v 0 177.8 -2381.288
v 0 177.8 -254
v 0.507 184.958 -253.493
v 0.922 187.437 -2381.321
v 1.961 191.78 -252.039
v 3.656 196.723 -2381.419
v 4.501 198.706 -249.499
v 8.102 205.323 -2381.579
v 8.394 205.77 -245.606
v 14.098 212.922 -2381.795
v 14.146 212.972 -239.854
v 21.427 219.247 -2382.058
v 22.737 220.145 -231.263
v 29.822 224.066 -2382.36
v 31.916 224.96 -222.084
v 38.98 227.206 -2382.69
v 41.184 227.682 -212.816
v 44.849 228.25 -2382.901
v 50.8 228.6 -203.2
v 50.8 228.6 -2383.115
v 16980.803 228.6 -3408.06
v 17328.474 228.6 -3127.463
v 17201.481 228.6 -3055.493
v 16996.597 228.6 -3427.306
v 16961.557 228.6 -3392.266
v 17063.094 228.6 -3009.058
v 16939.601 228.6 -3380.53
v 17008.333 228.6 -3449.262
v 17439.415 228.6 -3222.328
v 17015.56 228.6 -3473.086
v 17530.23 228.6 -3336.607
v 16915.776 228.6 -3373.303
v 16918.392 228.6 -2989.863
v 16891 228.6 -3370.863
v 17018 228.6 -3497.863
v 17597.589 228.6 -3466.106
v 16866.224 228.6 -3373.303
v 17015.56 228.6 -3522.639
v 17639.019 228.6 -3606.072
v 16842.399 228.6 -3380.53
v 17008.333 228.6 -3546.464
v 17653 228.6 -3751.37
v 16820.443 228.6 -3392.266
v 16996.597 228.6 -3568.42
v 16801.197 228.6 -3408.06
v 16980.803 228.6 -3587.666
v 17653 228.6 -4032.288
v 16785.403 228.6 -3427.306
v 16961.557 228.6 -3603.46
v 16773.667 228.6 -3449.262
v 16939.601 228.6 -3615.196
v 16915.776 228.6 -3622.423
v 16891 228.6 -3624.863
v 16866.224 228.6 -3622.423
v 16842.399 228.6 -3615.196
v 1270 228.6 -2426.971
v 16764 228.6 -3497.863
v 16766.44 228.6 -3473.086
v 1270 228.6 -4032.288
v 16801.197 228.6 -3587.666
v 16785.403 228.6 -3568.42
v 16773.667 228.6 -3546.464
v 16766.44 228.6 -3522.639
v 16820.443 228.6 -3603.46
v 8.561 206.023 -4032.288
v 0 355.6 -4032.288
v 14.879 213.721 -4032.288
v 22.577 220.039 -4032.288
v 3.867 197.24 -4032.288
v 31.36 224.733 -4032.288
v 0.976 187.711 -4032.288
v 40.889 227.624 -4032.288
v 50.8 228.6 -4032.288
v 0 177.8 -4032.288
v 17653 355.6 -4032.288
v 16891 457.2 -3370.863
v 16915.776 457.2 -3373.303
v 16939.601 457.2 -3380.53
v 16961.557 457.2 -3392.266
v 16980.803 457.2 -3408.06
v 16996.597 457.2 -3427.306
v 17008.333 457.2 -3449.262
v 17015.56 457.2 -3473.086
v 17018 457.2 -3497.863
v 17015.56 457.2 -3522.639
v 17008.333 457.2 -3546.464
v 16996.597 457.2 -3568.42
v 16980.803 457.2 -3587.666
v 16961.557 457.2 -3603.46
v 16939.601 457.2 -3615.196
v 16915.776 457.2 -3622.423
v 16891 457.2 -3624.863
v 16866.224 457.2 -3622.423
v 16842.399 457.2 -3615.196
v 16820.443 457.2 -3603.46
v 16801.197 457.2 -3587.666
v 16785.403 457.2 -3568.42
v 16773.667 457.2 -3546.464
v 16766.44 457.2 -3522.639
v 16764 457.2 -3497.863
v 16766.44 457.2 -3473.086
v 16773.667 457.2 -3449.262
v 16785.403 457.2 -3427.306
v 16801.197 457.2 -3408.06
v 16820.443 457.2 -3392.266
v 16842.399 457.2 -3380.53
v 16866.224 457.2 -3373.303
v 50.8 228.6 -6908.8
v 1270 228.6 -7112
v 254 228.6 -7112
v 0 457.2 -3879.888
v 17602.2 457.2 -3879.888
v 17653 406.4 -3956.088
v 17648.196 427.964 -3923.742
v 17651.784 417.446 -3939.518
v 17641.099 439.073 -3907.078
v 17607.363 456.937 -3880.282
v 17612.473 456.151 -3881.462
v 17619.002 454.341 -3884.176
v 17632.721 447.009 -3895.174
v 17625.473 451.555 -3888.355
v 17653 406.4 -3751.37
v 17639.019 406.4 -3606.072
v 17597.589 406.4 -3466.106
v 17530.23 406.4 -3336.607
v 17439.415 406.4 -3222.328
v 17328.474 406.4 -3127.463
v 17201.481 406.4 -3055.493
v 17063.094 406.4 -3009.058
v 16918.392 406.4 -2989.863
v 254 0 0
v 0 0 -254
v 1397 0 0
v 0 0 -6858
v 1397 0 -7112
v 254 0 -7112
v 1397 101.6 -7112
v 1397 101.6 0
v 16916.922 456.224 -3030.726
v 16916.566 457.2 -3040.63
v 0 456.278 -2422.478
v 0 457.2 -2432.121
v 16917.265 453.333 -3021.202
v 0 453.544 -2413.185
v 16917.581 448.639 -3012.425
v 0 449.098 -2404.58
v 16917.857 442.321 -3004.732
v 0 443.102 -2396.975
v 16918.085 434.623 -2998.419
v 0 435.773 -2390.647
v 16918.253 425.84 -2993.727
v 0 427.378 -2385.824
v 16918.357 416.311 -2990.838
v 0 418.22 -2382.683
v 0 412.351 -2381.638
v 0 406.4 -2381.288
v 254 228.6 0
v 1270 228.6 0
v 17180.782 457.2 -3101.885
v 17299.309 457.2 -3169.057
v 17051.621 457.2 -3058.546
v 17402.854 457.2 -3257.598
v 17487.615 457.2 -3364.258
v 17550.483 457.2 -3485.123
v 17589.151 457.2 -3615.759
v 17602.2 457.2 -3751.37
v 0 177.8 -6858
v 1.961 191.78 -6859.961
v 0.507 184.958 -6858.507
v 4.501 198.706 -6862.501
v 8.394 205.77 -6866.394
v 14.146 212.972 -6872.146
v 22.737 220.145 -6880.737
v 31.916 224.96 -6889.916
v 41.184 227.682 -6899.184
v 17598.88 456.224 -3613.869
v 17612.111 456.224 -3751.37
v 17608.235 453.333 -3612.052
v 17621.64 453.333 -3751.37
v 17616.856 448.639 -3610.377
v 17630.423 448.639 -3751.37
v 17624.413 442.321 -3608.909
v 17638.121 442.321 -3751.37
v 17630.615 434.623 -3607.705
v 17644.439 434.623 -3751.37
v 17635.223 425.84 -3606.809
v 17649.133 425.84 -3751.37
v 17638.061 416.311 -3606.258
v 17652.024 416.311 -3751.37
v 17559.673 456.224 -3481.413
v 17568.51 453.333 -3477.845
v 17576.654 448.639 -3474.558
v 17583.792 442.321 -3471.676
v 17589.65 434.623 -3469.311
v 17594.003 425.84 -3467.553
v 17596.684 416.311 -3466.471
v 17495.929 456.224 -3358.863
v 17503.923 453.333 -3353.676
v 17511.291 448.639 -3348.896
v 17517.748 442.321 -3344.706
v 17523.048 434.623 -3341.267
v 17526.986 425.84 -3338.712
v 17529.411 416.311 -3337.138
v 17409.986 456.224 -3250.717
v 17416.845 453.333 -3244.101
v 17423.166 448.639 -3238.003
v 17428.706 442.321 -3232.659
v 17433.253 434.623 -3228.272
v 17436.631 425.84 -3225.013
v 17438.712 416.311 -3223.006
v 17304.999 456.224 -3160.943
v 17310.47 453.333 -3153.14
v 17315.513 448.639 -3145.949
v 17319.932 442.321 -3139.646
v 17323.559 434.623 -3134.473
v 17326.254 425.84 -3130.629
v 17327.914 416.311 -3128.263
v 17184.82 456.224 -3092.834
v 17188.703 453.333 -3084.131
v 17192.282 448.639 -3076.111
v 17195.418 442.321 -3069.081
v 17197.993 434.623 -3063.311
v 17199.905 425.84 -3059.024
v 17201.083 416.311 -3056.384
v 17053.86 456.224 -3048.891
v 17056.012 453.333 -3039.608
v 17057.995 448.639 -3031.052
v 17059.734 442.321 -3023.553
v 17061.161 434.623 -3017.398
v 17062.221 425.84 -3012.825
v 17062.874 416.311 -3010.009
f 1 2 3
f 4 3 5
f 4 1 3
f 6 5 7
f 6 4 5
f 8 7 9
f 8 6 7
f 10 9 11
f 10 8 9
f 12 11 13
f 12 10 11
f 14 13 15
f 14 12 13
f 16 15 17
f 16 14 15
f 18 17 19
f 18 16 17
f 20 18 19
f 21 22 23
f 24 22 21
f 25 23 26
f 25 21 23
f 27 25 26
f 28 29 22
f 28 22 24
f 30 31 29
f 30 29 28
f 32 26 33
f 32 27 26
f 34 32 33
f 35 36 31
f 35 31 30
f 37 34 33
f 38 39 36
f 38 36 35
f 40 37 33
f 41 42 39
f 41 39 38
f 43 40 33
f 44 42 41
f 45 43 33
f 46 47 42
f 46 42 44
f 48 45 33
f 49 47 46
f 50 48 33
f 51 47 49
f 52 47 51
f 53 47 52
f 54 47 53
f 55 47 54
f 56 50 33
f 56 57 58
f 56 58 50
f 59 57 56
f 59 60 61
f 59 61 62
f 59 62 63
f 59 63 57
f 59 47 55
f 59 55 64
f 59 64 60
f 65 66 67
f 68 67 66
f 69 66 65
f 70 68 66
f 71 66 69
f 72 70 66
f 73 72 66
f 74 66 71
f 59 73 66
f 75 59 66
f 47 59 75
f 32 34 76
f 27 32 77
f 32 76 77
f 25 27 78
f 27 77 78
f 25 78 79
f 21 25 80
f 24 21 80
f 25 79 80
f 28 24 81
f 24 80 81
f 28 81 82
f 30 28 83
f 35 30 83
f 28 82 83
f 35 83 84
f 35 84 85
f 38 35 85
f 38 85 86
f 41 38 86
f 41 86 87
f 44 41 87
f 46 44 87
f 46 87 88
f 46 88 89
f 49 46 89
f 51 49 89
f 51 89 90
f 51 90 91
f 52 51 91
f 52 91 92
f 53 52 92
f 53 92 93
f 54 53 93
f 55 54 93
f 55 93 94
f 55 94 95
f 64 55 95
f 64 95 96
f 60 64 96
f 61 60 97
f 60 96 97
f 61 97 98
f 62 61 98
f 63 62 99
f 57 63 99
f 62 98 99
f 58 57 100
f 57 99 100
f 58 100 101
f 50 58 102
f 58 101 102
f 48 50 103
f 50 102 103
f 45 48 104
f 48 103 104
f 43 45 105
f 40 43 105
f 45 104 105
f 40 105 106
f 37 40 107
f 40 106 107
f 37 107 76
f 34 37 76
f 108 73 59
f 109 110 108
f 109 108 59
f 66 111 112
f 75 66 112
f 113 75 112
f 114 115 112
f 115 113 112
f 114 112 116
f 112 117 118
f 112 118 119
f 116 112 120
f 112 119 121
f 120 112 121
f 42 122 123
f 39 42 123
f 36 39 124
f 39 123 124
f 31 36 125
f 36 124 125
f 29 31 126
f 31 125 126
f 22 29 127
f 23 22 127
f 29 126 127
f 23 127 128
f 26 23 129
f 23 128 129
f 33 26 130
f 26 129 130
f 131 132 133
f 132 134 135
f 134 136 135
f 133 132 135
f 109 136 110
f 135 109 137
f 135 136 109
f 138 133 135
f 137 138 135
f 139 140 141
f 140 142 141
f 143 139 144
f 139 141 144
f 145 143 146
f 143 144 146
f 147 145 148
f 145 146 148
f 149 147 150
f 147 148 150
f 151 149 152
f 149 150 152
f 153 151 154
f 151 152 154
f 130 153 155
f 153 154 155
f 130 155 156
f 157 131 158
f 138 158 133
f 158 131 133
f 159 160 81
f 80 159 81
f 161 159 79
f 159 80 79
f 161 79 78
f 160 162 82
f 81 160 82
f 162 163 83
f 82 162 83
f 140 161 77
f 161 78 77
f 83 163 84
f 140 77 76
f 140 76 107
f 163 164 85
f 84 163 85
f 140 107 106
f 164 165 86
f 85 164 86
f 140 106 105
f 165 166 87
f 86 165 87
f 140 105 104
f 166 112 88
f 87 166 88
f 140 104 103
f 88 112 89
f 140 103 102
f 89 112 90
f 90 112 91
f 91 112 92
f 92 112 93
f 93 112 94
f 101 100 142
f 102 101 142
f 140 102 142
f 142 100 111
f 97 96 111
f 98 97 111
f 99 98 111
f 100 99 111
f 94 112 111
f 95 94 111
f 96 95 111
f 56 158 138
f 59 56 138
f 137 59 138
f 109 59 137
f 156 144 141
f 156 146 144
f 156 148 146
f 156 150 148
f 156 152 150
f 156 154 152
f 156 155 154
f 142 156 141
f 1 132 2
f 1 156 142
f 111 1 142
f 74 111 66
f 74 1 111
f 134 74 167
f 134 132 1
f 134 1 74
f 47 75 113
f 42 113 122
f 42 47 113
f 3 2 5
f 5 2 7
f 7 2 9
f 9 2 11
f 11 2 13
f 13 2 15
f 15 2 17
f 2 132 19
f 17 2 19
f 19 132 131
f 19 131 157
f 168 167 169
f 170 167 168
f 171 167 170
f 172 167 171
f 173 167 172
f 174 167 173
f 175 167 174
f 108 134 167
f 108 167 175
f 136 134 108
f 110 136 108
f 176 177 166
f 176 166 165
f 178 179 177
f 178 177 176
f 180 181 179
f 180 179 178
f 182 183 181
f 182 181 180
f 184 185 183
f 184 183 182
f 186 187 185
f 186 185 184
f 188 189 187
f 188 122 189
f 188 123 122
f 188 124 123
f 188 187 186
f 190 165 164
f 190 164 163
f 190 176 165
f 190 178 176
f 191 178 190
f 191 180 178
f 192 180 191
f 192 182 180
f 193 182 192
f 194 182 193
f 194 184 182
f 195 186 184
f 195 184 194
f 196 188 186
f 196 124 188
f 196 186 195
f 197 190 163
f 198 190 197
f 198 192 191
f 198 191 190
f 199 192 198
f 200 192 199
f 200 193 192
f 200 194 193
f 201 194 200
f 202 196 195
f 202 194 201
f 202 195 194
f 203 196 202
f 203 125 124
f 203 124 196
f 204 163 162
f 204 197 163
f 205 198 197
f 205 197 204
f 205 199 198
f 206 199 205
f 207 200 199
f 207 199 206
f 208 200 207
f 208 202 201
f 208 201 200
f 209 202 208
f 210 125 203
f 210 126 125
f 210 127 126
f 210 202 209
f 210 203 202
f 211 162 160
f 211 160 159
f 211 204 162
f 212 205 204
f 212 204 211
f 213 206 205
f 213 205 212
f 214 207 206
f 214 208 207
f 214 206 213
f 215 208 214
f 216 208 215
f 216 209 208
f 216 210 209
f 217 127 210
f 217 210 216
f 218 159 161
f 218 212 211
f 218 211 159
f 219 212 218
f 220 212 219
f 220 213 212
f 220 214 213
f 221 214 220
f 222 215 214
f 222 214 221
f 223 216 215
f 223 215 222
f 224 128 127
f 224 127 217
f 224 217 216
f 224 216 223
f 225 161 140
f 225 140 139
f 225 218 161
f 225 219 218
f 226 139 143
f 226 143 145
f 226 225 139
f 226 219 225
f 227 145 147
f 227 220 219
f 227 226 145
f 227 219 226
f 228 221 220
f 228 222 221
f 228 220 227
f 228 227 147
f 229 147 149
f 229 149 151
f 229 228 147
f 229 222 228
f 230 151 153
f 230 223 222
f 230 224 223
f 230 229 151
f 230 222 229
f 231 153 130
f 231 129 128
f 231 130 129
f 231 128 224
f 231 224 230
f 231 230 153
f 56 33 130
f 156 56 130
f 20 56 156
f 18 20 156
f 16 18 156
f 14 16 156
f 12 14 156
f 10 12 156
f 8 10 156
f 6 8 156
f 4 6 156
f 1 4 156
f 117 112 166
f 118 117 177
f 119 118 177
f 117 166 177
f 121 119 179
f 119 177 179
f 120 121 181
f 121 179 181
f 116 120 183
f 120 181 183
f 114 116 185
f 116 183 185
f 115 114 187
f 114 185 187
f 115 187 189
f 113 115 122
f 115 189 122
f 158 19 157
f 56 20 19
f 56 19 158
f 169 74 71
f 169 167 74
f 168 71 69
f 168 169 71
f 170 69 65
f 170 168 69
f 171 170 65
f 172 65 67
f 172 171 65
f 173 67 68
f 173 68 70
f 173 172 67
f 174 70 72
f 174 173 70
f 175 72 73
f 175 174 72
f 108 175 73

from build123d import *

# Parameters (mm, degrees)
SKETCH1_W           = 1397
SKETCH1_H           = 7112
BOSS_EXTRUDE1_DEPTH = 228.6
CHAMFER1_SIZE       = 127
CHAMFER3_SIZE       = 254
CHAMFER4_SIZE       = 254
BOSS_EXTRUDE2_DEPTH = 228.6
CHAMFER5_SIZE       = 101.6
CHAMFER5_SIZE2      = 152.4
FILLET1_R           = 762
FILLET2_R           = 50.8
SKETCH4_R           = 127
CUT_EXTRUDE1_DEPTH  = 19038.278819294


with BuildPart() as part:
    # Sketch1 → Boss-Extrude1 (new body)
    with BuildSketch(Plane(origin=(0, 0, 0), x_dir=(1, 0, 0), z_dir=(0, 1, 0))):
        with Locations((698.5, 3556)):
            Rectangle(SKETCH1_W, SKETCH1_H)
    extrude(amount=BOSS_EXTRUDE1_DEPTH)

    # Chamfer1
    chamfer1_edges = [part.edges().sort_by_distance(p)[0] for p in [
        (1397, 228.6, -3556),
    ]]
    chamfer(chamfer1_edges, length=CHAMFER1_SIZE)

    # Chamfer3
    chamfer3_edges = [part.edges().sort_by_distance(p)[0] for p in [
        (0, 114.3, -7112),
    ]]
    chamfer(chamfer3_edges, length=CHAMFER3_SIZE)

    # Chamfer4
    chamfer4_edges = [part.edges().sort_by_distance(p)[0] for p in [
        (0, 114.3, 0),
    ]]
    chamfer(chamfer4_edges, length=CHAMFER4_SIZE)

    # Sketch3 → Boss-Extrude2 (add)
    with BuildSketch(Plane(origin=(0, 228.6, 0), x_dir=(1, 0, 0), z_dir=(0, 1, 0))):
        Polygon((17653, 3016.28768746), (0, 2381.28768746), (0, 4032.28768746), (17653, 4032.28768746), align=None)
    extrude(amount=BOSS_EXTRUDE2_DEPTH)

    # Chamfer5
    chamfer5_edges = [part.edges().sort_by_distance(p)[0] for p in [
        (8826.5, 457.2, -4032.28768746),
    ]]
    chamfer5_side = [part.faces().sort_by_distance(p)[0] for p in [
        (8826.5, 342.9, -4032.28768746),
    ]]
    chamfer(chamfer5_edges, length=CHAMFER5_SIZE, length2=CHAMFER5_SIZE2, reference=chamfer5_side[0])

    # Fillet1
    fillet1_edges = [part.edges().sort_by_distance(p)[0] for p in [
        (17653, 342.9, -3016.28768746),
    ]]
    fillet(fillet1_edges, radius=FILLET1_R)

    # Fillet2
    fillet2_edges = [part.edges().sort_by_distance(p)[0] for p in [
        (0, 228.6, -5445.14384373),
        (0, 228.6, -1317.64384373),
        (8459.196177896, 457.2, -2685.575319758),
        (17653, 457.2, -3815.629065257),
        (17439.41452165, 457.2, -3222.328372473),
    ]]
    fillet(fillet2_edges, radius=FILLET2_R)

    # Sketch4 → Cut-Extrude1 (cut, through all)
    with BuildSketch(Plane(origin=(0, 457.2, 0), x_dir=(1, 0, 0), z_dir=(0, 1, 0))):
        with Locations(Location((16891, 3497.862952057, 0), (0, 0, 270))):
            Circle(SKETCH4_R)
    extrude(amount=-CUT_EXTRUDE1_DEPTH, mode=Mode.SUBTRACT)


solid = part.part
